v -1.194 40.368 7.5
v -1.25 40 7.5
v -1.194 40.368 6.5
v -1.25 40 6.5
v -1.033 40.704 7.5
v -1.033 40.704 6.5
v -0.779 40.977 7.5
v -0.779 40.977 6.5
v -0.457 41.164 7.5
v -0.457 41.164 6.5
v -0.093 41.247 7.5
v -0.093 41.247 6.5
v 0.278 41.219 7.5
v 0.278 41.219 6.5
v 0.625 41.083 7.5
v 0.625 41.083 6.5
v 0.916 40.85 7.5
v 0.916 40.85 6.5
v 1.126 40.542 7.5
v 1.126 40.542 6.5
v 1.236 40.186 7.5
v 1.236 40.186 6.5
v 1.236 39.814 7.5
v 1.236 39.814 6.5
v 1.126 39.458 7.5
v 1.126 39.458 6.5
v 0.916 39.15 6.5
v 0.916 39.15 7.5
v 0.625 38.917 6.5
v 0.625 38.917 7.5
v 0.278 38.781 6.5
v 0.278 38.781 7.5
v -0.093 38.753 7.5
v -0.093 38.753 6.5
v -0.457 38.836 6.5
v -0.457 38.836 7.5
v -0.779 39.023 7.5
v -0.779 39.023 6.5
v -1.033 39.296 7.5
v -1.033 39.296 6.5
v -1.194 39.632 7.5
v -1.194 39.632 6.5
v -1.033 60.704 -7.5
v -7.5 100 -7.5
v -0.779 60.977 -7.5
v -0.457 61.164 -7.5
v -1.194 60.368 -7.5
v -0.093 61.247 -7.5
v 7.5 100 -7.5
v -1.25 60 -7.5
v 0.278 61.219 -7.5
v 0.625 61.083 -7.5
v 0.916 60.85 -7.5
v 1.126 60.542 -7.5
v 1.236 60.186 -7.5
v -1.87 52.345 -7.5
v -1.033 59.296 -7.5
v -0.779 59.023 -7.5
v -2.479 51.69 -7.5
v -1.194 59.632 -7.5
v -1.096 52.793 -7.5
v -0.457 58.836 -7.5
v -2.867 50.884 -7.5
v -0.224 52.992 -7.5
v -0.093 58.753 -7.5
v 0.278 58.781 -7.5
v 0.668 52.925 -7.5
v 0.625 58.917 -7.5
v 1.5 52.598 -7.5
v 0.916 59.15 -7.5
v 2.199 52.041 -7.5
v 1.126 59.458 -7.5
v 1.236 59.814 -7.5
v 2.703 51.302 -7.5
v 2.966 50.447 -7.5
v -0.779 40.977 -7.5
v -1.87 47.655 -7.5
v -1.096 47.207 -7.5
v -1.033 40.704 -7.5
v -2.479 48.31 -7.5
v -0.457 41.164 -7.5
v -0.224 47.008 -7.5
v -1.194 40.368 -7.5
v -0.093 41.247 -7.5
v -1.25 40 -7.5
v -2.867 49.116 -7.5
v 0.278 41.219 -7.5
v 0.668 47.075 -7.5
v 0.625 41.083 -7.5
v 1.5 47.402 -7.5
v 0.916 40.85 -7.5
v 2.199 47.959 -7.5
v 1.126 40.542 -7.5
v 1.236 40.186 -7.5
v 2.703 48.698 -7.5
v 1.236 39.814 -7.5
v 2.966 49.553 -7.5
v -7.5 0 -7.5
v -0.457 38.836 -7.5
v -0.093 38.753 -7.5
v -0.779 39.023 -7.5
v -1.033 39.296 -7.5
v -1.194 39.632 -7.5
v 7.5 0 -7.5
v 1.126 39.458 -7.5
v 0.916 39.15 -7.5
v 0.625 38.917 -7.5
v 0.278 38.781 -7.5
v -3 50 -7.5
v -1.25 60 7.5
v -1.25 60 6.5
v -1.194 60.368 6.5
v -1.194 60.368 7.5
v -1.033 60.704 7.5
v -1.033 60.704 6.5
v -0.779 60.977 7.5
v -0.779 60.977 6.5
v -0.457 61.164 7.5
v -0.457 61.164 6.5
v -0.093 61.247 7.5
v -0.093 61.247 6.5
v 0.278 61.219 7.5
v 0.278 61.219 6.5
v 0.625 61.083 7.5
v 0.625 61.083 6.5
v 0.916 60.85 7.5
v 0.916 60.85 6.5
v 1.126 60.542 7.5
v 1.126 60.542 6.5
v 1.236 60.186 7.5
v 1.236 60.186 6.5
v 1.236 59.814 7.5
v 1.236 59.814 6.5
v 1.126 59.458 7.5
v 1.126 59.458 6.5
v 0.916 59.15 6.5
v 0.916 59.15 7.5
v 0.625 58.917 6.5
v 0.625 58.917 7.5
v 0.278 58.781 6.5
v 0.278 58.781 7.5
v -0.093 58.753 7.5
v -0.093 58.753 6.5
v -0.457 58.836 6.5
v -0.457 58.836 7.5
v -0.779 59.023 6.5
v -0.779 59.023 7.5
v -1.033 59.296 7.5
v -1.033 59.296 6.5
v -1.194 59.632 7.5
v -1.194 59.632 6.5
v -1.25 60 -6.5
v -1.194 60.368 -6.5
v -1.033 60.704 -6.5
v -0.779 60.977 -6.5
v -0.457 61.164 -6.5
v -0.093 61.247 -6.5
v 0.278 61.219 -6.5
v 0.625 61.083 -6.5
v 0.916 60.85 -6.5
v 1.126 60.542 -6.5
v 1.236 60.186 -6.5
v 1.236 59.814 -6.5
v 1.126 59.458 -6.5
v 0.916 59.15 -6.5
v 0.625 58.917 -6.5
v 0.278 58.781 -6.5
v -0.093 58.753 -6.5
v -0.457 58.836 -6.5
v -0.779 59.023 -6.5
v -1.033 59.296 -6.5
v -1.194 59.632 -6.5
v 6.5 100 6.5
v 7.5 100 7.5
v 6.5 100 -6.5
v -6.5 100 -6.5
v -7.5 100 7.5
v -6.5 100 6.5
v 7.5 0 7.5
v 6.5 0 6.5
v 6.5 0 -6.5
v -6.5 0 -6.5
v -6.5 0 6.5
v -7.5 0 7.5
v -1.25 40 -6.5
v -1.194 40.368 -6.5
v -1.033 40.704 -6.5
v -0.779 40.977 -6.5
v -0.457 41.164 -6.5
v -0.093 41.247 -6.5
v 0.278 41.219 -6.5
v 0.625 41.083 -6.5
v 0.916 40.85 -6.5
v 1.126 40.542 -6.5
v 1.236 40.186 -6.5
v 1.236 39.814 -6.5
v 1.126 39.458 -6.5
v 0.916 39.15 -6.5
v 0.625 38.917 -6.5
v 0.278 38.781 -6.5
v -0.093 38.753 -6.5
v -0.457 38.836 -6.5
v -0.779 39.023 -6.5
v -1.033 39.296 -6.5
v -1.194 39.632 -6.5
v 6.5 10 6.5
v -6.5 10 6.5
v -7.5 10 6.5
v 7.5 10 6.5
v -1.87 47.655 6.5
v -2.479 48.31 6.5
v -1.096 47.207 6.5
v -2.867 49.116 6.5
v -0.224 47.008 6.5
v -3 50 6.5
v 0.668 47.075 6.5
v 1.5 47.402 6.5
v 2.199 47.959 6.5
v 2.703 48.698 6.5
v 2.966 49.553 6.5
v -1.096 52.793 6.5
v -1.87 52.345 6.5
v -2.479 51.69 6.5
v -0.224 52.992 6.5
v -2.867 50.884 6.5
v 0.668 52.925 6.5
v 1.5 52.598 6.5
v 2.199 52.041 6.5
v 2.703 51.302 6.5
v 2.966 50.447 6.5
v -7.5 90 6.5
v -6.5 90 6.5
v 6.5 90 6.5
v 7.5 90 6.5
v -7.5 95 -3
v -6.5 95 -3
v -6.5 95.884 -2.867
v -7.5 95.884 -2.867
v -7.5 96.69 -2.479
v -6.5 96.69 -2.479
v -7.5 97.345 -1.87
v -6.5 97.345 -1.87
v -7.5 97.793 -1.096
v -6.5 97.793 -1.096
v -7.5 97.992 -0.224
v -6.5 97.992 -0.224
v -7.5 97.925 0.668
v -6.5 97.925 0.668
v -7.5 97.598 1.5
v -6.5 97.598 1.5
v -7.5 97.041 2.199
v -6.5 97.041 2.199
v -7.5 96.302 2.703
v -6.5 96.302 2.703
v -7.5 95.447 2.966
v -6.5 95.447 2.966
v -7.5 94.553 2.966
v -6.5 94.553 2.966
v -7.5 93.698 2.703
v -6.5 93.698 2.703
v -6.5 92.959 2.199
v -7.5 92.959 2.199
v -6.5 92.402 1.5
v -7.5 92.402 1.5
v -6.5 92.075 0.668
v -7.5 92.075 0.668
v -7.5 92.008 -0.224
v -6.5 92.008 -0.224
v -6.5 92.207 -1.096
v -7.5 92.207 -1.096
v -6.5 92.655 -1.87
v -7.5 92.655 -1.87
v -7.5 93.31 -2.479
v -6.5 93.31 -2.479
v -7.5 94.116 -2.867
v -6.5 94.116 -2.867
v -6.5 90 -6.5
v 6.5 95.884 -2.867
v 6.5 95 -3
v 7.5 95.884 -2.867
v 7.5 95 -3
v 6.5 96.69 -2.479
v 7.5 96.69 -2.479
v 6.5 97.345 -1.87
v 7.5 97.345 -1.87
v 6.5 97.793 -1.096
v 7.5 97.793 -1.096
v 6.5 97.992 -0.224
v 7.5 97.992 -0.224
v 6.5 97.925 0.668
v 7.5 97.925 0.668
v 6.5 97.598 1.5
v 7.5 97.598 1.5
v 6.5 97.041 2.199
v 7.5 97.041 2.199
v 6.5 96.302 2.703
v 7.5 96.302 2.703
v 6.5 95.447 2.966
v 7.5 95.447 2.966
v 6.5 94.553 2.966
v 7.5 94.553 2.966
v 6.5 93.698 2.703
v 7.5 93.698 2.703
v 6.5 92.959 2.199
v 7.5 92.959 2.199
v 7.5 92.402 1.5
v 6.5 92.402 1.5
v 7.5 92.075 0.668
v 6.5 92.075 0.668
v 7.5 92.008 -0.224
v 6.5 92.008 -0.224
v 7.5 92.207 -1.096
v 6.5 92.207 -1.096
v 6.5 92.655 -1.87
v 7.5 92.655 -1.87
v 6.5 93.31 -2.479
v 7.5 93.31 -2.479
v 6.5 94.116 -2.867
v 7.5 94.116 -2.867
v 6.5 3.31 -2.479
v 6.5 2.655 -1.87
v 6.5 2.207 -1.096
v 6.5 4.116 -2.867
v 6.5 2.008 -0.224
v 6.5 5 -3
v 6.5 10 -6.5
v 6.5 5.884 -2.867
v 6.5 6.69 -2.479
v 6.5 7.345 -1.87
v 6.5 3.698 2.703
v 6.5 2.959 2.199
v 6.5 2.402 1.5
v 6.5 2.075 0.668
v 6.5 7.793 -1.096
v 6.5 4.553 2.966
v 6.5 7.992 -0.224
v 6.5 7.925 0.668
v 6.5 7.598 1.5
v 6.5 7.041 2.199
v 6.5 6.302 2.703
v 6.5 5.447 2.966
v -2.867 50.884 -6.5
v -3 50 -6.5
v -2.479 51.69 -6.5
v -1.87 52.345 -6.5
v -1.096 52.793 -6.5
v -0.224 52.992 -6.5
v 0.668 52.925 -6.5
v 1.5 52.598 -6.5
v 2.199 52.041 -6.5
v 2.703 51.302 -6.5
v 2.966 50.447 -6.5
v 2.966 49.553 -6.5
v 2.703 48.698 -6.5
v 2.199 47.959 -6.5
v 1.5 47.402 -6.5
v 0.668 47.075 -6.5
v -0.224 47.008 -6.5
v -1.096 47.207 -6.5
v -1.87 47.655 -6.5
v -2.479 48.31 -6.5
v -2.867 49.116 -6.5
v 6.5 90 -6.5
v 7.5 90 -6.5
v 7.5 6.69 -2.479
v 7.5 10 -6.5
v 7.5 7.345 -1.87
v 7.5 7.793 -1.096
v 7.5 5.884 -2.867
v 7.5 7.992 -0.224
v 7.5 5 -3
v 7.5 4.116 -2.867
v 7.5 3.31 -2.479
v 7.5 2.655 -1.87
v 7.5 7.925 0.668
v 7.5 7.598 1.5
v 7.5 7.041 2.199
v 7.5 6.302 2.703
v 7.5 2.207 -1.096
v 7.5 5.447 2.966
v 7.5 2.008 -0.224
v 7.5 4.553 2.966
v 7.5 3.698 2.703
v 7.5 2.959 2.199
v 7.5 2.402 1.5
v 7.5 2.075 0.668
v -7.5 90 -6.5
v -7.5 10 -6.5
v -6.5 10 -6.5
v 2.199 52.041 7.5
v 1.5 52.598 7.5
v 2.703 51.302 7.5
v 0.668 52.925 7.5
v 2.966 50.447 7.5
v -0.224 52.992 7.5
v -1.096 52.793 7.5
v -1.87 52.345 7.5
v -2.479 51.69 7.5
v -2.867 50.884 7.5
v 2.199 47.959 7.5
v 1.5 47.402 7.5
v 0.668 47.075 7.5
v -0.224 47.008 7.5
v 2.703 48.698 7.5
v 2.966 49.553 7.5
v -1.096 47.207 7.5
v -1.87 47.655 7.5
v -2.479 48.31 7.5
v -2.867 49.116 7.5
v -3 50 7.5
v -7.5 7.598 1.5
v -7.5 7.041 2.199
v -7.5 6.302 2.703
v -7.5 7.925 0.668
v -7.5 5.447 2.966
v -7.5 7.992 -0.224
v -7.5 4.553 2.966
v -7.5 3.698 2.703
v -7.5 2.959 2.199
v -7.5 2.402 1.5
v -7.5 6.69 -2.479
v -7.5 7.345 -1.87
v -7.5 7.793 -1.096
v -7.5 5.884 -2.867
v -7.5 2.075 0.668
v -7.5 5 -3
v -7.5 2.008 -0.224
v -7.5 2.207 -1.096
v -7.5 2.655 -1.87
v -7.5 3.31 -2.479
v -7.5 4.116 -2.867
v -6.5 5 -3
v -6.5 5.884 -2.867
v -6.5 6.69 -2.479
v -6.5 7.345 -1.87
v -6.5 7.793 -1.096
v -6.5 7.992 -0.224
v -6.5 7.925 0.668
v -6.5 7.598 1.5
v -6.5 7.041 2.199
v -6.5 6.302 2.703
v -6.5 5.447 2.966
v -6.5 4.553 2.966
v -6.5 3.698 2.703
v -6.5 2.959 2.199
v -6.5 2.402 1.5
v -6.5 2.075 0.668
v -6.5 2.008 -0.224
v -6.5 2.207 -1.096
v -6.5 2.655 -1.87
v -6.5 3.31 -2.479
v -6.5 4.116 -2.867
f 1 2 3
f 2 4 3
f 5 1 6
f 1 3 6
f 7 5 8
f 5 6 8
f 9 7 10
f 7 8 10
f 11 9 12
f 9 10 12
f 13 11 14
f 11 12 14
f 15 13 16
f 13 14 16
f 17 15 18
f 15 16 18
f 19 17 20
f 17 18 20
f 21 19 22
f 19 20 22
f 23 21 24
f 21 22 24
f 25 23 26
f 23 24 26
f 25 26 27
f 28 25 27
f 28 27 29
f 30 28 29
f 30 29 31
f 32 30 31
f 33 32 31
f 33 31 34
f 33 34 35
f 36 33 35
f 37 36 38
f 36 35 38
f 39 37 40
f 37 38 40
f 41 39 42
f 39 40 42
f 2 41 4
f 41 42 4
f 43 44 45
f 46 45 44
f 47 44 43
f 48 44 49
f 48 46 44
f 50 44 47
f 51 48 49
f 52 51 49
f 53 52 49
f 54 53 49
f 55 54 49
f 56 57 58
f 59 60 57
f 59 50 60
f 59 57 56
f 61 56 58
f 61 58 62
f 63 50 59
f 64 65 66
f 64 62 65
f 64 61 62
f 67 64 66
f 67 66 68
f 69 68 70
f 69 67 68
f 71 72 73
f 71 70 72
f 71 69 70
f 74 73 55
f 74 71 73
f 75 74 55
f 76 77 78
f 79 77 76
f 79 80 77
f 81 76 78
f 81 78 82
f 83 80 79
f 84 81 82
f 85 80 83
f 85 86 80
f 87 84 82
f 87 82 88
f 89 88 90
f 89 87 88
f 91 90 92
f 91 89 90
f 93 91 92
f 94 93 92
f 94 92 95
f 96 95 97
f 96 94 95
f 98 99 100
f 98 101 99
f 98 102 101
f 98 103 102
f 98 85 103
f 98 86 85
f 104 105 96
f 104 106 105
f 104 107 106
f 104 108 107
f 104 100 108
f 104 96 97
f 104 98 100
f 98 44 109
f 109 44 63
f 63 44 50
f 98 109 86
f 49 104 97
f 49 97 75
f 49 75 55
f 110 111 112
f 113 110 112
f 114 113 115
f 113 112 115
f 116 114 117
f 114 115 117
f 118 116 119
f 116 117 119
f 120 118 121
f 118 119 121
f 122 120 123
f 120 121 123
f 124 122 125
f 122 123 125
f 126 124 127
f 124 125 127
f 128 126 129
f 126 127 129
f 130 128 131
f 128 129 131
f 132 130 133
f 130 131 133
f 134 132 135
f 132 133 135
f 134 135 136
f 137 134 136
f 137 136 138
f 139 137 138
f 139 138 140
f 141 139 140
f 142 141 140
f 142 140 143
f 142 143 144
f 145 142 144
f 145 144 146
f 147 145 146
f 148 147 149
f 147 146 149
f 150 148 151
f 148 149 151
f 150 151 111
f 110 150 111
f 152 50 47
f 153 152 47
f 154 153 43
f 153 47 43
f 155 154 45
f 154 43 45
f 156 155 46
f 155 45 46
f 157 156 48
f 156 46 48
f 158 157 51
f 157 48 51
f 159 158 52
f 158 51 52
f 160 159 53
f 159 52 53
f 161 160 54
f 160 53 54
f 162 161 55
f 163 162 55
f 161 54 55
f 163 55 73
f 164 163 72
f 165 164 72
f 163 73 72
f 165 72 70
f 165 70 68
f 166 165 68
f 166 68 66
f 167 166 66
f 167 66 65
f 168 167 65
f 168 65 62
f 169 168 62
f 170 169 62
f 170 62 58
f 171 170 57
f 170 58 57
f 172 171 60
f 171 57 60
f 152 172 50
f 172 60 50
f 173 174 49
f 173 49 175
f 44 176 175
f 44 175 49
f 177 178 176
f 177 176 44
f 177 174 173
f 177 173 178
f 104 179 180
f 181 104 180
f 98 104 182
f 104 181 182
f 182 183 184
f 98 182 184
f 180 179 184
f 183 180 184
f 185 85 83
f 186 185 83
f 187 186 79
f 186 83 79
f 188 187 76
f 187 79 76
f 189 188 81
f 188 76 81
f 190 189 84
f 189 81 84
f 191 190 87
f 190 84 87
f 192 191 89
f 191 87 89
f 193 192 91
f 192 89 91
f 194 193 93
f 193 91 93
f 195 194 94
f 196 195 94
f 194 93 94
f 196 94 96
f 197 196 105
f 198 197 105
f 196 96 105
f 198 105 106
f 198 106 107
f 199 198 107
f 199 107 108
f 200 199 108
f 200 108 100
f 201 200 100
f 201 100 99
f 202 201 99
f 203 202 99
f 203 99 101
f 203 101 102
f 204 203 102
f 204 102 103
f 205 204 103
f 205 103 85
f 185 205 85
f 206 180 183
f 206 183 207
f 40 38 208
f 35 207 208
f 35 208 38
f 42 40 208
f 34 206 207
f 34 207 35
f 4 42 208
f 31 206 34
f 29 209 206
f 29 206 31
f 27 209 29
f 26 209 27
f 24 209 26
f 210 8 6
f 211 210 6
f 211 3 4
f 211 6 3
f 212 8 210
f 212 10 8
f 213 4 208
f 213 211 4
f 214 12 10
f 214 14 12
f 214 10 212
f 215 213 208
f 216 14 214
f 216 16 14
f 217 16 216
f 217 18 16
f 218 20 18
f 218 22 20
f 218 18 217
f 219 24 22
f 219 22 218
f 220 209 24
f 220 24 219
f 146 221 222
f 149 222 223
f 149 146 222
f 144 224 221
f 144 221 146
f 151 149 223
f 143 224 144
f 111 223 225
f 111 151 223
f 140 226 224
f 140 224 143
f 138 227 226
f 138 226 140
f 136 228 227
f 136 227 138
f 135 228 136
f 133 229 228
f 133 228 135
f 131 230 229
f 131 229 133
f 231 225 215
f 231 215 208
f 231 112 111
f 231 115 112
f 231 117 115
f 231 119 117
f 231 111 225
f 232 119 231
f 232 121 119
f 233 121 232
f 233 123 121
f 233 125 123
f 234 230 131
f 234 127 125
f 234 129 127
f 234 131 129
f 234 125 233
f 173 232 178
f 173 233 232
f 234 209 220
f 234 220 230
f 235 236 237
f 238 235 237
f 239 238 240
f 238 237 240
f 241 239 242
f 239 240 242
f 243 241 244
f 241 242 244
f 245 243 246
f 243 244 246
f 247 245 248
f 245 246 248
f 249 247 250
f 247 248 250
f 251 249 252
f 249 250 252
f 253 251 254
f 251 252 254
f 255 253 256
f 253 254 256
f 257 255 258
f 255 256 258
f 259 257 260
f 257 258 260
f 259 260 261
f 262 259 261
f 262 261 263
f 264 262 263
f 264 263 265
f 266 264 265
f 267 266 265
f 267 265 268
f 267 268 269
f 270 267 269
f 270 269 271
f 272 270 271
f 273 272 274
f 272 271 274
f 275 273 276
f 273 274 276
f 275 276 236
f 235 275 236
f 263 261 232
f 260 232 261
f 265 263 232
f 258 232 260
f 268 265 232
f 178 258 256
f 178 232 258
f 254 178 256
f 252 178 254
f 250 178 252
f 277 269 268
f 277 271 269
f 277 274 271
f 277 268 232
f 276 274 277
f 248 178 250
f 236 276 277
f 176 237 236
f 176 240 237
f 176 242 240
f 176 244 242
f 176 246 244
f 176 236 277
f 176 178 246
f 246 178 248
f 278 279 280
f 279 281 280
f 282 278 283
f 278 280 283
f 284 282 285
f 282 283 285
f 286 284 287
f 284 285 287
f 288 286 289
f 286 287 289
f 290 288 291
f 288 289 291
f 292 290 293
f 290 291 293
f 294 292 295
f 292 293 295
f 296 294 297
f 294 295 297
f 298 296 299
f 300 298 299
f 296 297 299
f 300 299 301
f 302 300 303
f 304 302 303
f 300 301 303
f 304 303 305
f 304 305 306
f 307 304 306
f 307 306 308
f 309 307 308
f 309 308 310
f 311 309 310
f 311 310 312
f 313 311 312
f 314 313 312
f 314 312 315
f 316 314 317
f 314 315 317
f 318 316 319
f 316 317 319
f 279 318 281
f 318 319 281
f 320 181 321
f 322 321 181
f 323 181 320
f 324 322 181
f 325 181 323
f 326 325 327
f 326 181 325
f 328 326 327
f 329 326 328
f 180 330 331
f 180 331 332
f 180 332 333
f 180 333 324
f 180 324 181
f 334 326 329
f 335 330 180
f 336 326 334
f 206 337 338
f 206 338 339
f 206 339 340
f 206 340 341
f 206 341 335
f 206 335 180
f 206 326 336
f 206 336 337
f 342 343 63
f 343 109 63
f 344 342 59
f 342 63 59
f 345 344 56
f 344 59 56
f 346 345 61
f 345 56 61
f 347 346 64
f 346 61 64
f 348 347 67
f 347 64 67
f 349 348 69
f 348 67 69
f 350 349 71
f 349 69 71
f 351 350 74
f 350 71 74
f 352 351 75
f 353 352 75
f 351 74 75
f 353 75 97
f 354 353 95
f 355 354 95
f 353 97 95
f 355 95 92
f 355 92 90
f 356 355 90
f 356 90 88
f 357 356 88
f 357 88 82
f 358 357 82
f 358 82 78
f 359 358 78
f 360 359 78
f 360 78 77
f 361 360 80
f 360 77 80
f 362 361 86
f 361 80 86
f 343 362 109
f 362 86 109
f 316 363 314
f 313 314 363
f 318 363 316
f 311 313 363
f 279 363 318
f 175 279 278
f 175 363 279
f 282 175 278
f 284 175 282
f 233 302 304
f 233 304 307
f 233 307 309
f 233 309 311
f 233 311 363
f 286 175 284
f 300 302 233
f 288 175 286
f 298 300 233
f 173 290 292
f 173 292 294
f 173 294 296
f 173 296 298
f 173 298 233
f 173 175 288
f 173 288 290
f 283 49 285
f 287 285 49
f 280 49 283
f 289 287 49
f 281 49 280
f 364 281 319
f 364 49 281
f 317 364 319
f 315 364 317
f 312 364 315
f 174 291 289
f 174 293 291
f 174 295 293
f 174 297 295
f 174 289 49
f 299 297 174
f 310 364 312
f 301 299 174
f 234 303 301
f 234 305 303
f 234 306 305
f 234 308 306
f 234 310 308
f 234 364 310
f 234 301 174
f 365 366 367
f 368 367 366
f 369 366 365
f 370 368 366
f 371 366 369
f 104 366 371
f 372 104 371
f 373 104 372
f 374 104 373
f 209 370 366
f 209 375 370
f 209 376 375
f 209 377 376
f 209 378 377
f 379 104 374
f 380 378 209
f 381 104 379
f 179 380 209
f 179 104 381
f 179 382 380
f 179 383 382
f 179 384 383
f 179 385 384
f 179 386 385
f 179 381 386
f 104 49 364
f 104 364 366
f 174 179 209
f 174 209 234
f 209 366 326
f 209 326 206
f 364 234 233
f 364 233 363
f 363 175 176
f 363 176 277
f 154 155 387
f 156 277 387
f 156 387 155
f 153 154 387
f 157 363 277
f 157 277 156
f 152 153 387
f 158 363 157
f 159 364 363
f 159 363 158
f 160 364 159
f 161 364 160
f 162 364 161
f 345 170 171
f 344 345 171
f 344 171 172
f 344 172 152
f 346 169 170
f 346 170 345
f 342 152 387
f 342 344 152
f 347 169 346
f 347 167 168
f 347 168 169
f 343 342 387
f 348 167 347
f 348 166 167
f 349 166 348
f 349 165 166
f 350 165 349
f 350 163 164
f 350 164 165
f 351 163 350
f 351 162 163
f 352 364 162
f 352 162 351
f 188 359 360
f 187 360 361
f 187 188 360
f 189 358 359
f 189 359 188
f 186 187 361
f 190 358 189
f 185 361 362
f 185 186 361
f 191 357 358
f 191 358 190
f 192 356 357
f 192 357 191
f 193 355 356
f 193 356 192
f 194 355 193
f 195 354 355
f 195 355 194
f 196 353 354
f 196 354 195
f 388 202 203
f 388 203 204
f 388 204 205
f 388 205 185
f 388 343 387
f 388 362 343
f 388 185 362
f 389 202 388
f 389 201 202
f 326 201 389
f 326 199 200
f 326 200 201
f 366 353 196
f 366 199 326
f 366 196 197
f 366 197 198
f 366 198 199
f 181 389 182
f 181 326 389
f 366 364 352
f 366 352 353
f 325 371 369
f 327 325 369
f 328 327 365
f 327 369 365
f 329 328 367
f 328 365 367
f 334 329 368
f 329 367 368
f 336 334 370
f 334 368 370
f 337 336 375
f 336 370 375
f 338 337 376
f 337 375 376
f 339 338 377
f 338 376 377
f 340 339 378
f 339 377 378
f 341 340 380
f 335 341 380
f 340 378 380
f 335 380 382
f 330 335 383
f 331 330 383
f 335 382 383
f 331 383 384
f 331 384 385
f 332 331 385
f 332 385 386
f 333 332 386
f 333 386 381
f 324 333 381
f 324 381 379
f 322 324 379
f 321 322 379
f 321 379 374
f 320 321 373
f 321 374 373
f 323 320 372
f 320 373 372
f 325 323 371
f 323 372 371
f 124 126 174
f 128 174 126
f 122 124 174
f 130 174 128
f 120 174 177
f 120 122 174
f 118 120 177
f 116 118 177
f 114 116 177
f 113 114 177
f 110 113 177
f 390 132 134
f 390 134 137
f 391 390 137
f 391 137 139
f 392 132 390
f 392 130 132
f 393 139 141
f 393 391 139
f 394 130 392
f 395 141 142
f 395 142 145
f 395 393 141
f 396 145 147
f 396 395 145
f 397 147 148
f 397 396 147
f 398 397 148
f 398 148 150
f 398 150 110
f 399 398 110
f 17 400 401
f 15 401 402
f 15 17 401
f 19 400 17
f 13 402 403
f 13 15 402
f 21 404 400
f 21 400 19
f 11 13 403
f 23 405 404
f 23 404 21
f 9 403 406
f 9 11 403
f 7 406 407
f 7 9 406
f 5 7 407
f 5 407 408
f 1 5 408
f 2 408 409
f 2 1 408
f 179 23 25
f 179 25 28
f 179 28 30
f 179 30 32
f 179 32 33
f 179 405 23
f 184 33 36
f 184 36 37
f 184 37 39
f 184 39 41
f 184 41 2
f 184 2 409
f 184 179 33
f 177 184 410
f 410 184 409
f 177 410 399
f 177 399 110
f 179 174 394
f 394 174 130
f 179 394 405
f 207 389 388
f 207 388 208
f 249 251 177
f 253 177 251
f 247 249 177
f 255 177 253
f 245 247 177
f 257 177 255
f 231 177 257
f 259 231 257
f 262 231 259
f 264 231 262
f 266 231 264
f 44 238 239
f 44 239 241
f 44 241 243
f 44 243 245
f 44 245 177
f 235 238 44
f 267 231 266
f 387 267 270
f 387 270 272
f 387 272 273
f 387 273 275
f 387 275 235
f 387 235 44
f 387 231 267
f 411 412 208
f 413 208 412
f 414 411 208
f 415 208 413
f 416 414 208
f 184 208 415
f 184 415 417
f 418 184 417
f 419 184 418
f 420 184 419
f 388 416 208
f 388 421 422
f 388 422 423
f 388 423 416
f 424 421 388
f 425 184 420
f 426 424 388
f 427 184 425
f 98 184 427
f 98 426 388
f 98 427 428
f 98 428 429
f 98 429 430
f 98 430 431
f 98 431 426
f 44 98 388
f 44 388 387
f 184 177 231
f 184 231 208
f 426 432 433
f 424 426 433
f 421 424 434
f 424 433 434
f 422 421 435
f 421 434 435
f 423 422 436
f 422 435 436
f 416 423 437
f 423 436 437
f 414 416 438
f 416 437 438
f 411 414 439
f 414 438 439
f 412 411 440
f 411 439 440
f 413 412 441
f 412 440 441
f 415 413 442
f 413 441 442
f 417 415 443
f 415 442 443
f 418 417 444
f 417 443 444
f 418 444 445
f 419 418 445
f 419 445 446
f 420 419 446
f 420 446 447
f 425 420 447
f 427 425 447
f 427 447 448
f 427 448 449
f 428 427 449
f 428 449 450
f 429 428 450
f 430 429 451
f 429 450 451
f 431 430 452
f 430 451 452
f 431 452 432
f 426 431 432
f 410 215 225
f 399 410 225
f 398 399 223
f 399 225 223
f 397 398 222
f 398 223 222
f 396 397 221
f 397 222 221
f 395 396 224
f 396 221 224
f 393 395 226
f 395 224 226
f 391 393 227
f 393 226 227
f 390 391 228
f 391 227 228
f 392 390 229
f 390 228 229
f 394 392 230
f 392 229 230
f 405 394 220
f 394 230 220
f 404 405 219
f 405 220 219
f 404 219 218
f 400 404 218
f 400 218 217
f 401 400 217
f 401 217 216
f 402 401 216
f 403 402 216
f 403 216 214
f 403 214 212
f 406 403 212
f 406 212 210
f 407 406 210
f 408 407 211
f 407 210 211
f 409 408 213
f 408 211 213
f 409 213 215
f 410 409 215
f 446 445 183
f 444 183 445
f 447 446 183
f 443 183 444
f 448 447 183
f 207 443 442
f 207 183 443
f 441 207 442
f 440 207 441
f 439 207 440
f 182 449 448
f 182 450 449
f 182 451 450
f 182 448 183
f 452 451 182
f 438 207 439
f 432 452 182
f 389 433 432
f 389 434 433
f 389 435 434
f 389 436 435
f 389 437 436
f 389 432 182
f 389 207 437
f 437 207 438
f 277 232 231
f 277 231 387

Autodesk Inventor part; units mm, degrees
ref_plane "YZ Plane" through (0, 0, 0) normal (1, 0, 0) x (0, 1, 0)
ref_plane "XZ Plane" through (0, 0, 0) normal (0, 1, 0) x (-1, 0, 0)
ref_plane "XY Plane" through (0, 0, 0) normal (0, 0, 1) x (1, 0, 0)
sketch "Esquisse1" plane through (0, 0, 0) normal (0, 1, 0) x (-1, 0, 0)
  line L0 (-7.5, 7.5) -> (7.5, 7.5)
  line L1 (7.5, 7.5) -> (7.5, -7.5)
  line L2 (7.5, -7.5) -> (-7.5, -7.5)
  line L3 (-7.5, -7.5) -> (-7.5, 7.5)
  point P0 (0, 0)
  dimension "d0" = 15
  dimension "d1" = 15
  dimension "d2" = 7.5
  dimension "d3" = 7.5
extrude "Extrusion1" add sketch "Esquisse1" along normal blind 100
sketch "Esquisse2" plane through (0, 100, 0) normal (0, 1, 0) x (1, 0, 0)
  line L0 (-7.5, -7.5) -> (7.5, -7.5) projected
  line L1 (7.5, -7.5) -> (7.5, 7.5) projected
  line L2 (7.5, 7.5) -> (-7.5, 7.5) projected
  line L3 (-7.5, 7.5) -> (-7.5, -7.5) projected
  line L4 (-6.5, 6.5) -> (6.5, 6.5)
  line L5 (6.5, 6.5) -> (6.5, -6.5)
  line L6 (6.5, -6.5) -> (-6.5, -6.5)
  line L7 (-6.5, -6.5) -> (-6.5, 6.5)
  point P0 (0, 0)
  dimension "d6" = 1
  dimension "d7" = 1
  dimension "d8" = 1
  dimension "d9" = 1
extrude "Extrusion2" cut sketch "Esquisse2" against normal through all contours L4 L5 L6 L7
sketch "Esquisse3" plane through (7.5, 0, 7.5) normal (1, 0, 0) x (0, 0, -1)
  line L0 (15, 0) -> (0, 0) projected
  line L1 (15, 0) -> (15, 100) projected
  line L2 (0, 0) -> (0, 100) projected
  line L3 (1, 90) -> (14, 90)
  line L4 (14, 90) -> (14, 10)
  line L5 (14, 10) -> (1, 10)
  line L6 (1, 10) -> (1, 90)
  line L7 (1, 50) -> (14, 50) construction
  point P0 (7.5, 0)
  dimension "d12" = 80
  dimension "d13" = 1
  dimension "d14" = 1
  dimension "d15" = 100
  dimension "d16" = 50
extrude "Extrusion3" cut sketch "Esquisse3" against normal through all
sketch "Esquisse4" plane through (7.5, 0, 7.5) normal (1, 0, 0) x (0, 0, -1)
  line L0 (1, 10) -> (1, 90) projected
  line L1 (1, 90) -> (14, 90) projected
  line L2 (14, 90) -> (14, 10) projected
  line L3 (15, 0) -> (15, 100) projected
  line L4 (0, 0) -> (0, 100) projected
  line L5 (0, 90) -> (15, 90) construction
  line L6 (0, 90) -> (15, 100) construction
  line L7 (0, 100) -> (15, 90) construction
  circle A0 centre (7.5, 95) radius 3
  line L8 (1, 50) -> (14, 50) construction
  circle A1 centre (7.5, 5) radius 3
  point P0 (7.5, 0)
  dimension "d19" = 6
extrude "Extrusion4" cut sketch "Esquisse4" against normal through all
sketch "Esquisse5" plane through (7.5, 0, -7.5) normal (0, 0, -1) x (-1, 0, 0)
  line L0 (15, 0) -> (0, 0) projected
  line L1 (0, 100) -> (15, 100) projected
  line L2 (0, 0) -> (0, 100) projected
  circle A0 centre (7.5, 50) radius 3
  circle A1 centre (7.5, 40) radius 1.25
  circle A2 centre (7.5, 60) radius 1.25
  line L3 (7.5, 50) -> (0, 50) construction
  line L4 (7.5, 50) -> (7.5, 100) construction
  point P0 (7.5, 0)
  dimension "d22" = 6
  dimension "d23" = 100
  dimension "d24" = 50
  dimension "d25" = 7.5
  dimension "d26" = 10
  dimension "d27" = 2.5
extrude "Extrusion5" cut sketch "Esquisse5" against normal through all
equation "\"d2\" = 0.5 * d1"
equation "\"d3\" = d2"
equation "\"d16\" = 0.5 * d15"
properties part number "encoder_wheel_support"
